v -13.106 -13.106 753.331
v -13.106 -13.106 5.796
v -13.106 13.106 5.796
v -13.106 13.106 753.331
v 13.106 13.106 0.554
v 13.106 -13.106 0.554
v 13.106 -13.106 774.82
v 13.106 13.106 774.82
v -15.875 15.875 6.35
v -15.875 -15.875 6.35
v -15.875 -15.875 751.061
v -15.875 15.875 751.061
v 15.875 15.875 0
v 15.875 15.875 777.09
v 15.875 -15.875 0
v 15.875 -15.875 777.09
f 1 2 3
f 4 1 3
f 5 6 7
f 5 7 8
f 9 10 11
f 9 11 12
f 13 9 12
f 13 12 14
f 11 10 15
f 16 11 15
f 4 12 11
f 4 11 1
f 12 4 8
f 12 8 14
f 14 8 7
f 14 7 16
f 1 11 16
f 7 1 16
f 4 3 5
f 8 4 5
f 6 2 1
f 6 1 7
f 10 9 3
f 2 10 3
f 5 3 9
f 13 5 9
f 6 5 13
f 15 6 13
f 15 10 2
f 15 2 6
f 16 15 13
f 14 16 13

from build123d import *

# Parameters (mm, degrees)
SKETCH_W        = 31.75
SKETCH_H        = 31.75
SKETCH_W_2      = 26.2128
SKETCH_H_2      = 26.2128
PAD_DEPTH       = 777.09014
POCKET_DEPTH    = 31.75
POCKET001_DEPTH = 31.75


with BuildPart() as part:
    # Sketch → Pad (new body)
    with BuildSketch(Plane.XY):
        Rectangle(SKETCH_W, SKETCH_H)
        Rectangle(SKETCH_W_2, SKETCH_H_2, mode=Mode.SUBTRACT)
    extrude(amount=PAD_DEPTH)

    # Sketch001 → Pocket (cut)
    with BuildSketch(Plane.XZ.offset(15.875)):
        Polygon((15.875, 0), (-15.875, 0), (-15.875, 6.349981), align=None)
    extrude(amount=-POCKET_DEPTH, mode=Mode.SUBTRACT)

    # Sketch002 → Pocket001 (cut)
    with BuildSketch(Plane.XZ.offset(15.875)):
        Polygon((15.875, 777.09014), (-15.875, 777.09014), (-15.875, 751.061397), align=None)
    extrude(amount=-POCKET001_DEPTH, mode=Mode.SUBTRACT)


solid = part.part
